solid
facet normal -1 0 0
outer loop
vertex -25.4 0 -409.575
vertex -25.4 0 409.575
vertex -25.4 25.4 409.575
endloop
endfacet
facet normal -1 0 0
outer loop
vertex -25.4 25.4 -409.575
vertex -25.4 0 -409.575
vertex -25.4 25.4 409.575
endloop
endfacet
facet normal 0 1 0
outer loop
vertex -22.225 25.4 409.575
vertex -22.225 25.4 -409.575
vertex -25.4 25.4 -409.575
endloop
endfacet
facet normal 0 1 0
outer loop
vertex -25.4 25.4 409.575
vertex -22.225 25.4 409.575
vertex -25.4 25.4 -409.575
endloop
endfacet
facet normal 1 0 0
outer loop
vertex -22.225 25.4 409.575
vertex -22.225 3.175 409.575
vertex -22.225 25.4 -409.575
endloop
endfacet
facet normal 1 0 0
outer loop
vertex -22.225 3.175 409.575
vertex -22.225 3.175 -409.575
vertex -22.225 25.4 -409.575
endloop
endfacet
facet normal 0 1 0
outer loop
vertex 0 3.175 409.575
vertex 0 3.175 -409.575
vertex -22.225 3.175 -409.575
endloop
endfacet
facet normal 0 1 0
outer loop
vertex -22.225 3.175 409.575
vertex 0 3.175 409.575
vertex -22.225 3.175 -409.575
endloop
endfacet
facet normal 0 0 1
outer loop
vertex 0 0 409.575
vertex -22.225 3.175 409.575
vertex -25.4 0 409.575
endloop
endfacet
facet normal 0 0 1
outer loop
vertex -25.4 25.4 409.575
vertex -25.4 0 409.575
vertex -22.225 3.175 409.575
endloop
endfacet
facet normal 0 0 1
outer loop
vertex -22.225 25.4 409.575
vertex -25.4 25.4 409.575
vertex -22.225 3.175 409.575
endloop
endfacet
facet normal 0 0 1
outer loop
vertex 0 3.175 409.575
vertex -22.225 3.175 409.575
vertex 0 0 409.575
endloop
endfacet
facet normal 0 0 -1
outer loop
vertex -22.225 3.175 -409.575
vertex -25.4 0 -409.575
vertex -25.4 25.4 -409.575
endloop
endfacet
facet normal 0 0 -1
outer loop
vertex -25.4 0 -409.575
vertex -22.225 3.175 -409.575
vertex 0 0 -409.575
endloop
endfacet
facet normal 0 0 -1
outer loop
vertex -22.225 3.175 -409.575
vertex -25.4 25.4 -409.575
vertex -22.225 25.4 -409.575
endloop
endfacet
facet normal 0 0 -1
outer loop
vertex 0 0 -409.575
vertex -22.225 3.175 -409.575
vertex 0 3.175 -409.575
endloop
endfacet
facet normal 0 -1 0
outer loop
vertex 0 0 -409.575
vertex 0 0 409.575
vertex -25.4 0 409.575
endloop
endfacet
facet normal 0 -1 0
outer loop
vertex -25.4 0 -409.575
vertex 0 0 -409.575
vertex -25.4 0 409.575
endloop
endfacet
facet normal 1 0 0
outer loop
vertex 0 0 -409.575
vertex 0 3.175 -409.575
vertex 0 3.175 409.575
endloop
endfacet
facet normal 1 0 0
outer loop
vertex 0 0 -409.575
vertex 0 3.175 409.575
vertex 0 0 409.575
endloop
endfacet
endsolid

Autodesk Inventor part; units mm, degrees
ref_plane "YZ Plane" through (0, 0, 0) normal (1, 0, 0) x (0, 1, 0)
ref_plane "XZ Plane" through (0, 0, 0) normal (0, 1, 0) x (-1, 0, 0)
ref_plane "XY Plane" through (0, 0, 0) normal (0, 0, 1) x (1, 0, 0)
sketch "Sketch1" plane through (0, 0, 0) normal (0, 0, 1) x (1, 0, 0)
  line L0 (0, 0) -> (-25.4, 0)
  line L1 (-25.4, 0) -> (-25.4, 25.4)
  line L2 (0, 3.175) -> (-22.225, 3.175)
  line L3 (-22.225, 3.175) -> (-22.225, 25.4)
  line L4 (-22.225, 25.4) -> (-25.4, 25.4)
  line L5 (0, 3.175) -> (0, 0)
  dimension "d0" = 25.4
  dimension "d1" = 25.4
  dimension "d2" = 3.175
extrude "Extrusion1" add sketch "Sketch1" along normal mid plane 819.15
properties part number "32.25 Top L w holes"
